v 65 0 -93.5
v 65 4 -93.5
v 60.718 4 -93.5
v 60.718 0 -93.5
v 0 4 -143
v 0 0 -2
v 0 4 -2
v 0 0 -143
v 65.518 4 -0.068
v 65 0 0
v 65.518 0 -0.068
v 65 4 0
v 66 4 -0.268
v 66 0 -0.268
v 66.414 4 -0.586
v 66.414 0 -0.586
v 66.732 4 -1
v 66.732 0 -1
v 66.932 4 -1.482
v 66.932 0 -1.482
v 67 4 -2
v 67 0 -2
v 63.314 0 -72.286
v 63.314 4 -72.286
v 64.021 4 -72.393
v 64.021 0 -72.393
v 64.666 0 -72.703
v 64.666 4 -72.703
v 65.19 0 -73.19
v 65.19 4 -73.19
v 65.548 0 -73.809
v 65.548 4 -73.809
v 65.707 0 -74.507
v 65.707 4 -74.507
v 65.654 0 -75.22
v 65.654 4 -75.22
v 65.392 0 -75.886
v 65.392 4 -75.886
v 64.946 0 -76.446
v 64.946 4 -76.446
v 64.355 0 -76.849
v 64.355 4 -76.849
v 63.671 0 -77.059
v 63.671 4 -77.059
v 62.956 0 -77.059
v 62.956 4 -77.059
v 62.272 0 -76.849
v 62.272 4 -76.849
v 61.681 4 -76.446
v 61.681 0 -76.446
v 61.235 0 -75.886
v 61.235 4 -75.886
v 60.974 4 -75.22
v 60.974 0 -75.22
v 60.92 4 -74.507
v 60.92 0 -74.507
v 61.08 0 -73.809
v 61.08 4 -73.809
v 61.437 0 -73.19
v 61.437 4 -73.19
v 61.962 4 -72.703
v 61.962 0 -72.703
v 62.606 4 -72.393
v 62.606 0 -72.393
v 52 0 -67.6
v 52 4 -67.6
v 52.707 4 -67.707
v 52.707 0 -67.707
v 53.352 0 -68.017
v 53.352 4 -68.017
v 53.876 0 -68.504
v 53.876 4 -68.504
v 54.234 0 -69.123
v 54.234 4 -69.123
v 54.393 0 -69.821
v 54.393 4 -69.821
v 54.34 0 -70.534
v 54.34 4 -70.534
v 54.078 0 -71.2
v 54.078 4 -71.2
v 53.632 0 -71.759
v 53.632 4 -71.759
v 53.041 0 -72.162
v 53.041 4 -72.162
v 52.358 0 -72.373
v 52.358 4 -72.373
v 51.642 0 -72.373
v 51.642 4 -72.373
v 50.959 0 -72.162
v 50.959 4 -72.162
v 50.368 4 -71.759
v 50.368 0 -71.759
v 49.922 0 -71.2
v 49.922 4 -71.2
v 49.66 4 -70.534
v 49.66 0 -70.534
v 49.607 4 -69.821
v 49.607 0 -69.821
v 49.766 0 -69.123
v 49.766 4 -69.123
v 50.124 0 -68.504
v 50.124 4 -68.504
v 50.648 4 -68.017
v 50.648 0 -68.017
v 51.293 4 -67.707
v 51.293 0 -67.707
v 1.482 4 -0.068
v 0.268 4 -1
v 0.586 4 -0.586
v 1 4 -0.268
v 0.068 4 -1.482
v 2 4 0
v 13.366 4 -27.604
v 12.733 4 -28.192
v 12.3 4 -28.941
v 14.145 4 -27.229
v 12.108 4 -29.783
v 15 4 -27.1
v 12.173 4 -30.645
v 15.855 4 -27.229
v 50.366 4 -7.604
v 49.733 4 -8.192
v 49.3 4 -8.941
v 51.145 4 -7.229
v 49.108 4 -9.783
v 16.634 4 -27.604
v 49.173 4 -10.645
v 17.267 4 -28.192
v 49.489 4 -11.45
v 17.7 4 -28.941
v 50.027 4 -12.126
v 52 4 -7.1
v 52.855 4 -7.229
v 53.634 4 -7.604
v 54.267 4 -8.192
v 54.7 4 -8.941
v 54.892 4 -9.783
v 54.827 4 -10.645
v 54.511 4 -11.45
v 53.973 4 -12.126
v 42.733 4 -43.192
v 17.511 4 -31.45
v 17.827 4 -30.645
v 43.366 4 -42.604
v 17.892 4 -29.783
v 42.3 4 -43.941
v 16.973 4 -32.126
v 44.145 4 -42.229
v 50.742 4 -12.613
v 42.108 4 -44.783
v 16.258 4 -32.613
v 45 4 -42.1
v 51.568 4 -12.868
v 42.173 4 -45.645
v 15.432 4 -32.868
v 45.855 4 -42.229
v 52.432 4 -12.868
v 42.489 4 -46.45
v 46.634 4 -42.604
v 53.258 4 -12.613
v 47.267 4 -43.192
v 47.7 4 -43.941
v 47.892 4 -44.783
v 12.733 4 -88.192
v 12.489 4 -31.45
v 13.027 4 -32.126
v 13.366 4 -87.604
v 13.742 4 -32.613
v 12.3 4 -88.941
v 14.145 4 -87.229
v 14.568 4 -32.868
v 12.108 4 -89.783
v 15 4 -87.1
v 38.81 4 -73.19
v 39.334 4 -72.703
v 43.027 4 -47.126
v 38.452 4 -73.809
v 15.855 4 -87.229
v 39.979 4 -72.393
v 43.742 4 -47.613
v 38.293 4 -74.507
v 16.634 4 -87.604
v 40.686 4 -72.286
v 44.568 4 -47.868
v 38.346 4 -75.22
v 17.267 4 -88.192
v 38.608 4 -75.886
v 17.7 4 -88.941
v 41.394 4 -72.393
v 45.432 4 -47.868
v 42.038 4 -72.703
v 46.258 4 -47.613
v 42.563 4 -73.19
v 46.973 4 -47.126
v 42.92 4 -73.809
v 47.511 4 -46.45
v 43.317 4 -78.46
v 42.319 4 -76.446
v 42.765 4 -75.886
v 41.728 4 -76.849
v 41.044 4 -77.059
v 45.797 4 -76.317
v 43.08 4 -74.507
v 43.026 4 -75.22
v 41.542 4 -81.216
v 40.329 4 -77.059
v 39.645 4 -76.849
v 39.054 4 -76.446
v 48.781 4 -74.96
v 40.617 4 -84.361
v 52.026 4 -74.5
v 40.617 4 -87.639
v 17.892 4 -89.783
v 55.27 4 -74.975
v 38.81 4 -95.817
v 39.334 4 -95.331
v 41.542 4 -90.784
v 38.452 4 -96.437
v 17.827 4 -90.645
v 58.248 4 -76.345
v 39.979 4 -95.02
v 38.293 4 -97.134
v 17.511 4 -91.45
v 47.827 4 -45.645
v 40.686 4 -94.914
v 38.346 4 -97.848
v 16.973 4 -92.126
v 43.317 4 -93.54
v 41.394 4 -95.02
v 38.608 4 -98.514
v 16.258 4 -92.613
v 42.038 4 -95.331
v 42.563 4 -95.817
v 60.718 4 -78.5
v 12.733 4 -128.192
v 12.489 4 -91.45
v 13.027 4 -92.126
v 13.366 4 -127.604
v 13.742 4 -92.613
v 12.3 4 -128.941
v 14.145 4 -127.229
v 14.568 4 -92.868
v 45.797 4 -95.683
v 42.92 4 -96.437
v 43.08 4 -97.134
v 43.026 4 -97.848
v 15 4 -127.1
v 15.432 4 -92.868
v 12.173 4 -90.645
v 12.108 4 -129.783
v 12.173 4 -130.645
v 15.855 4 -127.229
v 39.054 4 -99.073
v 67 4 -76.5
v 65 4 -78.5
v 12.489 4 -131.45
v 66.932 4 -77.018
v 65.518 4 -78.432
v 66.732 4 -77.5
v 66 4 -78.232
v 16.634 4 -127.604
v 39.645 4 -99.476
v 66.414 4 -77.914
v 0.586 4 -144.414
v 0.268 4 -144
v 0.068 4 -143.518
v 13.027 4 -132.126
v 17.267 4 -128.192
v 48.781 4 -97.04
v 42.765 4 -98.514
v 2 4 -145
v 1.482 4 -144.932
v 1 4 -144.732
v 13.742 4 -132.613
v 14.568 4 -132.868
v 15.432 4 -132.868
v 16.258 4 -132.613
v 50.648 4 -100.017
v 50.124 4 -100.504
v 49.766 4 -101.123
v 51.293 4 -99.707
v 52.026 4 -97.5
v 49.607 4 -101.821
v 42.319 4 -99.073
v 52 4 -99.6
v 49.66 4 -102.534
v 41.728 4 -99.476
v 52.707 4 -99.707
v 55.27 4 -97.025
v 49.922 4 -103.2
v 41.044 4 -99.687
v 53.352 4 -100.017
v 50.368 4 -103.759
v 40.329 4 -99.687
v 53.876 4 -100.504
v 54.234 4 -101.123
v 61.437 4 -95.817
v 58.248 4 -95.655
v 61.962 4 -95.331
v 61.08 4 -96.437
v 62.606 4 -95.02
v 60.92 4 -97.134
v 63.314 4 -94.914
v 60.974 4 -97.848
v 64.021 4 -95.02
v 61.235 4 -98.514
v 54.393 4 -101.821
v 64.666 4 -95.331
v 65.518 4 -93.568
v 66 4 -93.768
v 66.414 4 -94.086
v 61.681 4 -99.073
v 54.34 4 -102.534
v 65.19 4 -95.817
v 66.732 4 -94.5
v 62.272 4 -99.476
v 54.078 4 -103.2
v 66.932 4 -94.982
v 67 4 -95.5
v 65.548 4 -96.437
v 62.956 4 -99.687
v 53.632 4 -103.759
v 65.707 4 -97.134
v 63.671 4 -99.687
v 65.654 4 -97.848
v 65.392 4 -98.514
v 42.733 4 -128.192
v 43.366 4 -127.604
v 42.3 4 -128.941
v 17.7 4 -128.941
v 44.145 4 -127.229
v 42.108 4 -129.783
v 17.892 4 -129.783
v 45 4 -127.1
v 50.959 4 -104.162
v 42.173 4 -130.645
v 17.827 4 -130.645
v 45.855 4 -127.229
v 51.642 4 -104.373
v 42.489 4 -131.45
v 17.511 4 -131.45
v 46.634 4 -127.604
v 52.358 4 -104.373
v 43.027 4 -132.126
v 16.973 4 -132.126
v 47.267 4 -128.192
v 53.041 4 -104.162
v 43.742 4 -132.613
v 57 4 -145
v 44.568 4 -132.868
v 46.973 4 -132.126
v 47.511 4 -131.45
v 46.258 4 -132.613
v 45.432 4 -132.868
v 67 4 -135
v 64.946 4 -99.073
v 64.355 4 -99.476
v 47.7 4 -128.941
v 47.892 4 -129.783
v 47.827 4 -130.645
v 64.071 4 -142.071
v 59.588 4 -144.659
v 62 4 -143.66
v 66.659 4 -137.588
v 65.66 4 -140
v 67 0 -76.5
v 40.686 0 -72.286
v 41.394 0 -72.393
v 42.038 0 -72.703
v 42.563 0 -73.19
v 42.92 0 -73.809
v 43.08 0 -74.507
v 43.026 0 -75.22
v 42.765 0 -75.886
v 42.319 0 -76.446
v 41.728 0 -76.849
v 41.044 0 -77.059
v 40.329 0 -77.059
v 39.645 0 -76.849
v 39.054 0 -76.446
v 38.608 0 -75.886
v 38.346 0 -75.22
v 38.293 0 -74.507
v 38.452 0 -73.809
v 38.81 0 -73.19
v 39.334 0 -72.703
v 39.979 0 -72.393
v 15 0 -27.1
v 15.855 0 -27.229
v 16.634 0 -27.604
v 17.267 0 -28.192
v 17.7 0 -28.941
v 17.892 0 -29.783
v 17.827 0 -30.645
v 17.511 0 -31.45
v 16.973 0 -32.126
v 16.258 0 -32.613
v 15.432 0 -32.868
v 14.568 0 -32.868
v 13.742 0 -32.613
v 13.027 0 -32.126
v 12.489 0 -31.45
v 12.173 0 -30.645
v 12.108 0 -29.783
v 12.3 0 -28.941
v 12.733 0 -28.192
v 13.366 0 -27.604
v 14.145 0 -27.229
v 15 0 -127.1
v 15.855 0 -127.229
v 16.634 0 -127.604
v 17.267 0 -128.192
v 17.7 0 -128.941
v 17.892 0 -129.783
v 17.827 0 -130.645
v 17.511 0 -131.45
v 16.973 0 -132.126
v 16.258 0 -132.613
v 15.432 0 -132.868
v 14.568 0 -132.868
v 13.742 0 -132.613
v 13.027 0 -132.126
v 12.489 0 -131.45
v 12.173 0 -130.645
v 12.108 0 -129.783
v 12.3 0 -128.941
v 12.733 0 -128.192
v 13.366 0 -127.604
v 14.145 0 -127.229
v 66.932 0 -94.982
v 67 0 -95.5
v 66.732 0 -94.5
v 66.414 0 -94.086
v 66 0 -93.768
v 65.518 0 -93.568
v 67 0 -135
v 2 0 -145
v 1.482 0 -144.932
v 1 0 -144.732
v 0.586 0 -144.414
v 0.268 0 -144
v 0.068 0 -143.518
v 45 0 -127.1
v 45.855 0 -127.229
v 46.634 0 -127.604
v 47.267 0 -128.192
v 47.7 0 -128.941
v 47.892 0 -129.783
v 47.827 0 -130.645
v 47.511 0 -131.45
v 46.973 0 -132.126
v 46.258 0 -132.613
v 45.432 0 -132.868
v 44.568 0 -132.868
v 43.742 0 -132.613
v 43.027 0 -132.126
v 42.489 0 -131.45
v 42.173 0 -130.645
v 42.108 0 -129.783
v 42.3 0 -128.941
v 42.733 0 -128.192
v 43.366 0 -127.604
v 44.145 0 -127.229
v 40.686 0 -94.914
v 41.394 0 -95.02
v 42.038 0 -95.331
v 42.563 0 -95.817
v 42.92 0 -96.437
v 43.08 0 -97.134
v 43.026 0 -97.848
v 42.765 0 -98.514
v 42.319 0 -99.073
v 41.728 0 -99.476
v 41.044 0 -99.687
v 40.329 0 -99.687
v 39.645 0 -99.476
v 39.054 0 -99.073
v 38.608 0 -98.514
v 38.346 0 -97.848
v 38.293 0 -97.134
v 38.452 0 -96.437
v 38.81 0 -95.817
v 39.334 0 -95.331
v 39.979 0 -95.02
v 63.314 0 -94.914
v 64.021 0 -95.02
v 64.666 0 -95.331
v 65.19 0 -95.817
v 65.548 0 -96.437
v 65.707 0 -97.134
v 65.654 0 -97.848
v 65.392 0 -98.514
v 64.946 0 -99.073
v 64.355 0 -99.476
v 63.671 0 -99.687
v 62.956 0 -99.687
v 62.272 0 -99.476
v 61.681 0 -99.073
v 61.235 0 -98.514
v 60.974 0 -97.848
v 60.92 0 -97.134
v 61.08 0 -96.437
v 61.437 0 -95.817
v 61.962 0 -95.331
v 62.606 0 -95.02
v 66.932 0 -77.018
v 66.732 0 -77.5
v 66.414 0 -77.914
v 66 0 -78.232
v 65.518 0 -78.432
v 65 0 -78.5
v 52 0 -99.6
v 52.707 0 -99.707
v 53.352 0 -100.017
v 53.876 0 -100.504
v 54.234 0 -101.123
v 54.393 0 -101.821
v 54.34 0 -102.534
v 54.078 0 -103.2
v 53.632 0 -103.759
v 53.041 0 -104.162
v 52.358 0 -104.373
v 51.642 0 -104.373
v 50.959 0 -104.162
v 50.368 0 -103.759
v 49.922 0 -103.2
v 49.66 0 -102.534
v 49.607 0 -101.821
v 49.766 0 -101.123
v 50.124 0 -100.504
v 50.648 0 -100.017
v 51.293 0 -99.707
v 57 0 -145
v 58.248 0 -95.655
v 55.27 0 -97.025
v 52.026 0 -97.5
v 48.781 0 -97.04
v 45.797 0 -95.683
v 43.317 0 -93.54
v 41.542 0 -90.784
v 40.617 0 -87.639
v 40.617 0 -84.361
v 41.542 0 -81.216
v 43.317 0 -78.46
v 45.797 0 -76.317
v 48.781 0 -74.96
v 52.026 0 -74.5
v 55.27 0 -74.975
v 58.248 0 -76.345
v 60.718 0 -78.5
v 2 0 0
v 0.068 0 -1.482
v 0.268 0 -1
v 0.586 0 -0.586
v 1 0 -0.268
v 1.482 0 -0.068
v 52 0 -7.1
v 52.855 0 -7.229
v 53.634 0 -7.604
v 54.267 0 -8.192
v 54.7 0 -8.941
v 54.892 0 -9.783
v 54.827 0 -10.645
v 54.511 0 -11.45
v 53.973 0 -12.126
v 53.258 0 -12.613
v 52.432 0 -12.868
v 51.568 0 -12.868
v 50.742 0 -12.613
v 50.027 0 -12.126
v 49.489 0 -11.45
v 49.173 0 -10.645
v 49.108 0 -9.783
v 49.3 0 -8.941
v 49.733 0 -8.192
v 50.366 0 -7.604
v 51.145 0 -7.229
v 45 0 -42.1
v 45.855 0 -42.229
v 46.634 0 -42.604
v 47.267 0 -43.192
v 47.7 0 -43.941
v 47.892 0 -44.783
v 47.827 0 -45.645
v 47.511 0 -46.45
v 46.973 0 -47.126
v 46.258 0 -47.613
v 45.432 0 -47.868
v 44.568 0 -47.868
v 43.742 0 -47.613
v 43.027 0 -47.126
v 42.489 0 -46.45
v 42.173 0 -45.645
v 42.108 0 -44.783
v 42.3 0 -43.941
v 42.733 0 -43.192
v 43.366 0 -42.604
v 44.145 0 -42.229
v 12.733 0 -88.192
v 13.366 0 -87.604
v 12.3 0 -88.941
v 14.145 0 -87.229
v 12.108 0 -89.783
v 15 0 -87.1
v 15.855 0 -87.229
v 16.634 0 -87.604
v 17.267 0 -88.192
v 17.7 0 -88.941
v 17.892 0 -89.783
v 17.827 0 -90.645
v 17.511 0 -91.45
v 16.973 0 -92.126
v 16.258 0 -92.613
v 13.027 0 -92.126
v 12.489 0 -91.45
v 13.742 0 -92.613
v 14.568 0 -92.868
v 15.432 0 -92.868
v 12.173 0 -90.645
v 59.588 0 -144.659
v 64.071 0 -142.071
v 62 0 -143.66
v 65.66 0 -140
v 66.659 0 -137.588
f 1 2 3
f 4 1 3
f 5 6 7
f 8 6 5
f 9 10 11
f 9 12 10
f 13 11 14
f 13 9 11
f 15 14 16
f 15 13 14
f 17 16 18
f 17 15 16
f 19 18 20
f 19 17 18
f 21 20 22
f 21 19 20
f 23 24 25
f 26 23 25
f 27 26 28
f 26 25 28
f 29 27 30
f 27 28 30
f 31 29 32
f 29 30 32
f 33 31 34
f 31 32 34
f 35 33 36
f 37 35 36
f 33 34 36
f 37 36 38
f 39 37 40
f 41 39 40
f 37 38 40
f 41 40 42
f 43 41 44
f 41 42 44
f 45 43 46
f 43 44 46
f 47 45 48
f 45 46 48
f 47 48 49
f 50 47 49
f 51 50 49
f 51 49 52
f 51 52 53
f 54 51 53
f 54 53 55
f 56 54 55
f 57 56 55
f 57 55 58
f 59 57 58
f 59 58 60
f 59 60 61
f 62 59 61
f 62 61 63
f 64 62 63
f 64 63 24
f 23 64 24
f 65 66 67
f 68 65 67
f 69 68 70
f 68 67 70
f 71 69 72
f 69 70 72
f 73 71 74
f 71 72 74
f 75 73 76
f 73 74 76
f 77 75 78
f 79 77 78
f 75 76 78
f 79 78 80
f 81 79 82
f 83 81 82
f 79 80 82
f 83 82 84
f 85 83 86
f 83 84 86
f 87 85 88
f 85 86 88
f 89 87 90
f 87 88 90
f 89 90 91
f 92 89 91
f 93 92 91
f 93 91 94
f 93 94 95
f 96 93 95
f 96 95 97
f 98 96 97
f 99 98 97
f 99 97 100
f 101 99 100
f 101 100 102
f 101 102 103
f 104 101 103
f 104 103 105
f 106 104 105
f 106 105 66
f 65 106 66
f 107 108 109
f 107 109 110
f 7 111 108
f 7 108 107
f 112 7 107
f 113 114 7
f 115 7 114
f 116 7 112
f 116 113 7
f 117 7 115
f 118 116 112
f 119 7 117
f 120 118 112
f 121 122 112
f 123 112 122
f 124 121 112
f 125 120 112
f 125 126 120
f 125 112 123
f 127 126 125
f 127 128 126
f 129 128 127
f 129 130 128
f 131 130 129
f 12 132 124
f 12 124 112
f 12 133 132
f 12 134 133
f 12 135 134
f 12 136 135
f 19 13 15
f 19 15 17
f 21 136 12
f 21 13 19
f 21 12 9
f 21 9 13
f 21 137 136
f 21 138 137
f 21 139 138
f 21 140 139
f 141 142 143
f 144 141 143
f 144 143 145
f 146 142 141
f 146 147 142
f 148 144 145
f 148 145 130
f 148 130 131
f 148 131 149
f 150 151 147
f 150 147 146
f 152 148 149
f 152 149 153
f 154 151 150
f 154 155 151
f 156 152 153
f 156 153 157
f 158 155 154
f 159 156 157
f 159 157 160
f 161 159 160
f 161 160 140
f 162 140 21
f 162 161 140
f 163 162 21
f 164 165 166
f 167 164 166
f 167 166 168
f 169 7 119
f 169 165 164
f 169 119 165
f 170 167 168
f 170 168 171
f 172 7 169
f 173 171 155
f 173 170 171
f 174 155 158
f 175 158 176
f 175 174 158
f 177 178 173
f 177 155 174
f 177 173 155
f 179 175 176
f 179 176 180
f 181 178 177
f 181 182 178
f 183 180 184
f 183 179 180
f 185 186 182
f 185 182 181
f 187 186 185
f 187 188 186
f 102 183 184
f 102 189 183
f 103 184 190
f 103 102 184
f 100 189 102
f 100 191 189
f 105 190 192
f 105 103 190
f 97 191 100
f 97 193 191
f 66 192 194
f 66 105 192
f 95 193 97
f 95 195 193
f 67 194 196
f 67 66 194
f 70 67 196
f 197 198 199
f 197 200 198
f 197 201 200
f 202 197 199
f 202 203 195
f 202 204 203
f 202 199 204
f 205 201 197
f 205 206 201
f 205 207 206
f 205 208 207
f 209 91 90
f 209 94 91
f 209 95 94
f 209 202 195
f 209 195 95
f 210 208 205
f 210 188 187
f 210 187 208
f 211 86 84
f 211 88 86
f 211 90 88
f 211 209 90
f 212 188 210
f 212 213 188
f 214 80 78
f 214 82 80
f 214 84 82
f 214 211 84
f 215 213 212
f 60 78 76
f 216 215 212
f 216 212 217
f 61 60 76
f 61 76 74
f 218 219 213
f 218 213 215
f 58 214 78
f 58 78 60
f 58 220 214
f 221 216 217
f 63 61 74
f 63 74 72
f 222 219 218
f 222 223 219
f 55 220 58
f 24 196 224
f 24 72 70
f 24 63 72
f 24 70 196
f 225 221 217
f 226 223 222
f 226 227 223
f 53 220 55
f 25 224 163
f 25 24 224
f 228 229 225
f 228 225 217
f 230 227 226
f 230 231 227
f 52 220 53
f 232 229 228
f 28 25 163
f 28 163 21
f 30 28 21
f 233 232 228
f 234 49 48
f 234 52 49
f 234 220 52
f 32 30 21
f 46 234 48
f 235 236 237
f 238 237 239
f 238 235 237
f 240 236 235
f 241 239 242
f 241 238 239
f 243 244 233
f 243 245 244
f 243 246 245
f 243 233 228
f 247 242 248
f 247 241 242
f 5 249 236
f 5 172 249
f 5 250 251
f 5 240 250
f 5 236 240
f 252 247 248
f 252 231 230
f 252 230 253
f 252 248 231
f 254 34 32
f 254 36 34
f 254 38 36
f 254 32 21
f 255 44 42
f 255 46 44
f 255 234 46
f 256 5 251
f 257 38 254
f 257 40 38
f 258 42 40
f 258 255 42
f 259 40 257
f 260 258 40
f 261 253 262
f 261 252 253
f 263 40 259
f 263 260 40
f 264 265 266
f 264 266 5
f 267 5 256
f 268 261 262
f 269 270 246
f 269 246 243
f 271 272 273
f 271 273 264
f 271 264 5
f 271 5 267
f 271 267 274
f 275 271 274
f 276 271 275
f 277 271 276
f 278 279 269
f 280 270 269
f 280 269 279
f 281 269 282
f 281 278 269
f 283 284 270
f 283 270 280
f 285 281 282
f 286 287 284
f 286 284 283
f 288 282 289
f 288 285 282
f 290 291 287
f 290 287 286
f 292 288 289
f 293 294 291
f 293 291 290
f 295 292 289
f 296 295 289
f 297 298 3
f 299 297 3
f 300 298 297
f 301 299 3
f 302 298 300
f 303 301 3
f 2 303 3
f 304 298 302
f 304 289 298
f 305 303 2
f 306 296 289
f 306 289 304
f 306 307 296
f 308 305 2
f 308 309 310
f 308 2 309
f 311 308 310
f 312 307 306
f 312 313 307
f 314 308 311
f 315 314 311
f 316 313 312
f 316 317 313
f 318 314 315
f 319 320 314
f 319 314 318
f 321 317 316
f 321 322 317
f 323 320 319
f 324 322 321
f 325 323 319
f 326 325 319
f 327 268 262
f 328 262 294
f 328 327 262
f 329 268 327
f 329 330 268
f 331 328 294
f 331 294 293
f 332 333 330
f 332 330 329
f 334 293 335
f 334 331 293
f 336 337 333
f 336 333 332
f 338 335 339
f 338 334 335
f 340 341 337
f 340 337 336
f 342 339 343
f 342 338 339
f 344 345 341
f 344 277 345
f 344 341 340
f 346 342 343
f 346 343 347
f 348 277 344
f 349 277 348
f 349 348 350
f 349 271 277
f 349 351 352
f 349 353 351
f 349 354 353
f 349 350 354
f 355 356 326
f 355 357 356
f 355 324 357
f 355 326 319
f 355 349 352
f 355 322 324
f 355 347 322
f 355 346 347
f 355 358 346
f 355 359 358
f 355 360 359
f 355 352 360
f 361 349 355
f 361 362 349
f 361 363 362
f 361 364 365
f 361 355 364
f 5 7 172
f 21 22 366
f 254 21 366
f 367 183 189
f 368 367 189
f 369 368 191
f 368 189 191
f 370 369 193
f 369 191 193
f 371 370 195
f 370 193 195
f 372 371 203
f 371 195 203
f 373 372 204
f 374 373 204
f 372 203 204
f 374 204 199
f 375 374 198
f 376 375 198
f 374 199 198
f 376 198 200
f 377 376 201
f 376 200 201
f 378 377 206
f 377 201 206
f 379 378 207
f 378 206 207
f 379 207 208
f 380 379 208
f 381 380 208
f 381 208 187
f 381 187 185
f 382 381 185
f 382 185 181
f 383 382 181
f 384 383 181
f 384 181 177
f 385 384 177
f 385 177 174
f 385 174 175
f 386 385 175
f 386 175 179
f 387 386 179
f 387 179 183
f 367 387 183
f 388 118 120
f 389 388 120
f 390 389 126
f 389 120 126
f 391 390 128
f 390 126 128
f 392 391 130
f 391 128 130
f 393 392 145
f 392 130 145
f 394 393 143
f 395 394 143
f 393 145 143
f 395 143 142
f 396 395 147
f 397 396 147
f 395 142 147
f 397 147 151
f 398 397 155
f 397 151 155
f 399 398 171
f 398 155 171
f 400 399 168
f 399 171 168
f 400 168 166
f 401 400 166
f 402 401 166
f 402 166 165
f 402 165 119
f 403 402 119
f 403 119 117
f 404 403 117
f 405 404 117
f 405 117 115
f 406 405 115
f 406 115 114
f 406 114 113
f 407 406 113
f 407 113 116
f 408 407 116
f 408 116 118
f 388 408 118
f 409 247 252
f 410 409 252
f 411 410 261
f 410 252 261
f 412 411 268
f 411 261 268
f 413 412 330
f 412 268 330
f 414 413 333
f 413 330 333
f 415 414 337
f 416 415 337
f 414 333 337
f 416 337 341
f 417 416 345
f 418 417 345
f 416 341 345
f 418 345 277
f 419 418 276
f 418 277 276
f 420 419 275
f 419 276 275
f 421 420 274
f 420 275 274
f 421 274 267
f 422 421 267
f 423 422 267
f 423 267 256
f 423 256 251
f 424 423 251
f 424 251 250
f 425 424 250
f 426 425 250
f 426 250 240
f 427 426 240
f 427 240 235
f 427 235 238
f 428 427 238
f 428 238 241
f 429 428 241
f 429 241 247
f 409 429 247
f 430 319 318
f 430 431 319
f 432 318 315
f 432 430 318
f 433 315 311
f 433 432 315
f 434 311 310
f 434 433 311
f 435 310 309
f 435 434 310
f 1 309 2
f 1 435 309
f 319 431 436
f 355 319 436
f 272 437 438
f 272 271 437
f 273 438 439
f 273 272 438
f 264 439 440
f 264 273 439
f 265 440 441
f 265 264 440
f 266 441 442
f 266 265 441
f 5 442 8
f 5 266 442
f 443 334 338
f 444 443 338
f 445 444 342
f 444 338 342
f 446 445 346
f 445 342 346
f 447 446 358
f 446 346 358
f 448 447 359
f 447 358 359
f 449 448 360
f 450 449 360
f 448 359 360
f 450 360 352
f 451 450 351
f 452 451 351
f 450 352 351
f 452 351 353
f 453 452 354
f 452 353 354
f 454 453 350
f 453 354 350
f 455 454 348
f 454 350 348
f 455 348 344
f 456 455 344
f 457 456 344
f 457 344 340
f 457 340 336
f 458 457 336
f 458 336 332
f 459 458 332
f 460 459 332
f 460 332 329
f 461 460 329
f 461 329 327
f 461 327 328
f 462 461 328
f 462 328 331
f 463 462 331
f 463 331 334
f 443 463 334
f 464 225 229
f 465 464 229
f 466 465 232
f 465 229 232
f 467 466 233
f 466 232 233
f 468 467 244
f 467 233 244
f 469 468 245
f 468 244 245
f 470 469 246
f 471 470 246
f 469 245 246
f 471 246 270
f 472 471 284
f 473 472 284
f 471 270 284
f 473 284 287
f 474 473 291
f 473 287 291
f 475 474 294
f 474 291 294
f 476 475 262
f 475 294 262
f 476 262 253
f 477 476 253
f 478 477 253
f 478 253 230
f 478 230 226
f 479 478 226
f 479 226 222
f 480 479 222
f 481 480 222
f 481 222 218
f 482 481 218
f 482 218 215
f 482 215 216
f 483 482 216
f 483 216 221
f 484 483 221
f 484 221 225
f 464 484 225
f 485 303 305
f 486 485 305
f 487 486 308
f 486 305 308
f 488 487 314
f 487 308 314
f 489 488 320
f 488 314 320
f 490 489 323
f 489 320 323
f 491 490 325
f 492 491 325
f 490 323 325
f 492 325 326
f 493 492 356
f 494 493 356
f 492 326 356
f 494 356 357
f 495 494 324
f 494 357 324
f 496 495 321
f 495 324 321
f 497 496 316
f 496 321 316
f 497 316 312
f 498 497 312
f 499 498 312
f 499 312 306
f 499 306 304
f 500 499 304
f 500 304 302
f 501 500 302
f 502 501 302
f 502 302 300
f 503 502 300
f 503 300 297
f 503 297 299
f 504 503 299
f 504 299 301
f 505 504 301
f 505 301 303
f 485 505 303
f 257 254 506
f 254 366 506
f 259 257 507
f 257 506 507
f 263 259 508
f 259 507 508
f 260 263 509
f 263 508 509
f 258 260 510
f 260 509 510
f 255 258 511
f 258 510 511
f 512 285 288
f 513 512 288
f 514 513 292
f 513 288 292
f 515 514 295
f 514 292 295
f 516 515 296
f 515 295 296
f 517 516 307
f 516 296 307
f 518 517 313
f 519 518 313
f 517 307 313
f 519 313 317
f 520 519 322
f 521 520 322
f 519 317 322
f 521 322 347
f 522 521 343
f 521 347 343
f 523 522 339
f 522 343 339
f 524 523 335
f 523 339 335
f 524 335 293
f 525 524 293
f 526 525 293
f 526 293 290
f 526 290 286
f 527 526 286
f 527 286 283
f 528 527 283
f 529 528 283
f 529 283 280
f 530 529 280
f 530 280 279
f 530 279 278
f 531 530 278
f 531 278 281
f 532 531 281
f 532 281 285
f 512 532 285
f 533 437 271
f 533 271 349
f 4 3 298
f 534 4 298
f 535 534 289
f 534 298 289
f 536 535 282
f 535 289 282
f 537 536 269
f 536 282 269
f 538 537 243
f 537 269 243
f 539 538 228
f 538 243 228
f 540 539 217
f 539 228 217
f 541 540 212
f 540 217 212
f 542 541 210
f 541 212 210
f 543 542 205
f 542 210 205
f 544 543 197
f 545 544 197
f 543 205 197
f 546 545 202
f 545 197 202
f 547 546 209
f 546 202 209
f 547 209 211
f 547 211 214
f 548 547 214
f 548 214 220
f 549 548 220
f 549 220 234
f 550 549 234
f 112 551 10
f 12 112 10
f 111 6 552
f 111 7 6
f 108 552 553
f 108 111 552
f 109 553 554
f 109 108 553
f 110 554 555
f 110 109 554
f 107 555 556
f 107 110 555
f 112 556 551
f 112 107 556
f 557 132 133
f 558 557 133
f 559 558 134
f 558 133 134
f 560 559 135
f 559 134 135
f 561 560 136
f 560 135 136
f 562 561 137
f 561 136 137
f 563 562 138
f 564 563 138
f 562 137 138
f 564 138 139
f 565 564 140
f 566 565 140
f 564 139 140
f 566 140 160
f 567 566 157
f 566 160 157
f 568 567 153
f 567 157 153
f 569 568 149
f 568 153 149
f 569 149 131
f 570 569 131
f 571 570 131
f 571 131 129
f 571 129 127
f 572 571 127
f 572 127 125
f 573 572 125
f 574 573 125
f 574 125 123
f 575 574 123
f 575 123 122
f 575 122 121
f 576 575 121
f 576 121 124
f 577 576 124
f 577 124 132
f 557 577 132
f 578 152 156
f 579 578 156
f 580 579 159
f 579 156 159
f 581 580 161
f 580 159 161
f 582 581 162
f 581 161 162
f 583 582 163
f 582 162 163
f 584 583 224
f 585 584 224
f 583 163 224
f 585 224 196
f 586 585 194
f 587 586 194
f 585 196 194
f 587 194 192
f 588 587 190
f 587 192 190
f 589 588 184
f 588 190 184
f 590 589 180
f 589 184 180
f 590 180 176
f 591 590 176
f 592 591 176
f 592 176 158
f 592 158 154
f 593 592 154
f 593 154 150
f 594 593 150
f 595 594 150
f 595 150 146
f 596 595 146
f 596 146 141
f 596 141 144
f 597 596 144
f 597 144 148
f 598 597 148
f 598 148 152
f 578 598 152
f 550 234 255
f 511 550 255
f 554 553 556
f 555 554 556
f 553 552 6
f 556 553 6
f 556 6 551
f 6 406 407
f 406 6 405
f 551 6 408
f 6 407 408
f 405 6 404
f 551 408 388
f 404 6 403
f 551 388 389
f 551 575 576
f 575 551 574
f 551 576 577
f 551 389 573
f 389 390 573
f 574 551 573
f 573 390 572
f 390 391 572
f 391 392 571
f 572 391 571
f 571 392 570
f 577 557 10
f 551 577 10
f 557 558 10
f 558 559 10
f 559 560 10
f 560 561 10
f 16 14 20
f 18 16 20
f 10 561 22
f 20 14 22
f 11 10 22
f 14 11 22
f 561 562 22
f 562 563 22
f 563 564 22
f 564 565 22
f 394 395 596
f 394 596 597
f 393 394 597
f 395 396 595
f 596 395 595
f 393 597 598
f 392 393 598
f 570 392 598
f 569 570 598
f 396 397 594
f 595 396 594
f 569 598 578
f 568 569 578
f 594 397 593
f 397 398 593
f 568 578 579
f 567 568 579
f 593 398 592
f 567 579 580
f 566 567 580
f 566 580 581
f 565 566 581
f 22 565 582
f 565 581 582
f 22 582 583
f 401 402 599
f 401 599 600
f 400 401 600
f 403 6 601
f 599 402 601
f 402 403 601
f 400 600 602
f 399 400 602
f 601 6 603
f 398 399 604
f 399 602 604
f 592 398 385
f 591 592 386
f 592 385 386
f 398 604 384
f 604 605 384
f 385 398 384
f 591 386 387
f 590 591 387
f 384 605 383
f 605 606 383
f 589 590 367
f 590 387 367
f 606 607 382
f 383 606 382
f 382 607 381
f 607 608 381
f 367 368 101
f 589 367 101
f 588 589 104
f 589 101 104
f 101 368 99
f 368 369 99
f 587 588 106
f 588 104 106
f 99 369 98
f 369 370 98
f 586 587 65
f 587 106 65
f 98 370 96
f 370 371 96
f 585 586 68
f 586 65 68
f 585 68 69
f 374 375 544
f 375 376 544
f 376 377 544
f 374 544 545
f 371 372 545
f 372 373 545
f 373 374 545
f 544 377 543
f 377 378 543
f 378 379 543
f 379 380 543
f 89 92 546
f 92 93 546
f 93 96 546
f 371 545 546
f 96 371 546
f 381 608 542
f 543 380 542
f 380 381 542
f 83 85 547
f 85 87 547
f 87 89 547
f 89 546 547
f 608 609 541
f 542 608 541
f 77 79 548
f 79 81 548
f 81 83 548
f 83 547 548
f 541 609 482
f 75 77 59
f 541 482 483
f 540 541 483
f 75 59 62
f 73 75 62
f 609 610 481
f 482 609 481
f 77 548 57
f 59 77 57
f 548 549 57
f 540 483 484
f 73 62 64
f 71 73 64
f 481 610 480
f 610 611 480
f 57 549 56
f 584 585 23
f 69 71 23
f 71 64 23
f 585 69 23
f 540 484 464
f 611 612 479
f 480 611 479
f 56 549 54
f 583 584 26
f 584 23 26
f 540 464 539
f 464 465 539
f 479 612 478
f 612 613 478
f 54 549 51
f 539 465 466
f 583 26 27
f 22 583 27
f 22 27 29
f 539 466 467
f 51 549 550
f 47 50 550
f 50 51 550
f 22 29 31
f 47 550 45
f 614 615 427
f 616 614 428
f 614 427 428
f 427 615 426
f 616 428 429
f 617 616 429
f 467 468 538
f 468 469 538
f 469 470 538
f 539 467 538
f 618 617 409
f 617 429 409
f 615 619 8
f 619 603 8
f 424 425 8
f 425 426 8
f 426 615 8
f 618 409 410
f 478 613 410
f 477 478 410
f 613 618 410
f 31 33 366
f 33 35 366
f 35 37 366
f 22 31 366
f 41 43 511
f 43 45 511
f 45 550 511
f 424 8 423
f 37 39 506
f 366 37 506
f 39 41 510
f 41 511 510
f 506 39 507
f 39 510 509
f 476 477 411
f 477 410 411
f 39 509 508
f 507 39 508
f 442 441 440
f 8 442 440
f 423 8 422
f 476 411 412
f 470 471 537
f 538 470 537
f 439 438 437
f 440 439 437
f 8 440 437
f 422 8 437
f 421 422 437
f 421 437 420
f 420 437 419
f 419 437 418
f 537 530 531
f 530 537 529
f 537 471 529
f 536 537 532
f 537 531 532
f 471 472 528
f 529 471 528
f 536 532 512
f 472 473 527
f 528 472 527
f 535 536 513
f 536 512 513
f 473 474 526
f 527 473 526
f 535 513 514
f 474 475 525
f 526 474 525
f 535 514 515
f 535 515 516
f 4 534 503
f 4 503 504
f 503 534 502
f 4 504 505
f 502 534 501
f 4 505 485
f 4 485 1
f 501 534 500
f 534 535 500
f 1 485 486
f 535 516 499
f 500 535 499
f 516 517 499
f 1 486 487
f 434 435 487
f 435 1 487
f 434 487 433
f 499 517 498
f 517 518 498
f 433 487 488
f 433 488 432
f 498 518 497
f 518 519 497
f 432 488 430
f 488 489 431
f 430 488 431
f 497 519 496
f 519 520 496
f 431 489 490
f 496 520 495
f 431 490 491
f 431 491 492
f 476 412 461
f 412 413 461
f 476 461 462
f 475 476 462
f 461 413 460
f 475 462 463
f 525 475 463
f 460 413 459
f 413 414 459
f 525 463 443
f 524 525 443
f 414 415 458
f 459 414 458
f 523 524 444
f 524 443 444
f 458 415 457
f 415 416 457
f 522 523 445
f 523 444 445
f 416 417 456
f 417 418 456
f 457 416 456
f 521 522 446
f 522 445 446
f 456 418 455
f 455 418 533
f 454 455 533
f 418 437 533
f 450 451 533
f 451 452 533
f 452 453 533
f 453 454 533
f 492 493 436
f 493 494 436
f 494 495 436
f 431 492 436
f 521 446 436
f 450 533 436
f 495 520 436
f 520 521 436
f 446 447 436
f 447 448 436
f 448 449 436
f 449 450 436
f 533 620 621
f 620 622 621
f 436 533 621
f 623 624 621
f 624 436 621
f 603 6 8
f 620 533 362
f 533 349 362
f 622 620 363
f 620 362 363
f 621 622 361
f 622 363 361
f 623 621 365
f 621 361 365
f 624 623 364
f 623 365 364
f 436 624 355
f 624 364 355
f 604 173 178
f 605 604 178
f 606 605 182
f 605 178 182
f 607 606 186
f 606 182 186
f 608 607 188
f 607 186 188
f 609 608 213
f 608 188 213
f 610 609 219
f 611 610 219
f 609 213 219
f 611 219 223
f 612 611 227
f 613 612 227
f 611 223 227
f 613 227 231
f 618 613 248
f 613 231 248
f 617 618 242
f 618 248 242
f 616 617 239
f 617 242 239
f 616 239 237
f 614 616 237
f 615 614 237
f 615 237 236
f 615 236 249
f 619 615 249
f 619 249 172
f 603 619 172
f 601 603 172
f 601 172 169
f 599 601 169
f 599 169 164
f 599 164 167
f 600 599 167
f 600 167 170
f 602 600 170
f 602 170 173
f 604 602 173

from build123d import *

# Parameters (mm, degrees)
SKETCH1_W           = 67
SKETCH1_H           = 145
BOSS_EXTRUDE1_DEPTH = 4
CUT_EXTRUDE1_DEPTH  = 160.781100259
SKETCH4_R           = 2.4
CUT_EXTRUDE2_DEPTH  = 160.781100259
SKETCH5_R           = 2.9
CUT_EXTRUDE3_DEPTH  = 160.781100259
FILLET1_R           = 10
FILLET2_R           = 2


with BuildPart() as part:
    # Sketch1 → Boss-Extrude1 (new body)
    with BuildSketch(Plane(origin=(0, 0, 0), x_dir=(1, 0, 0), z_dir=(0, 1, 0))):
        with Locations((33.5, 72.5)):
            Rectangle(SKETCH1_W, SKETCH1_H)
    extrude(amount=BOSS_EXTRUDE1_DEPTH)

    # Sketch2 → Cut-Extrude1 (cut, through all)
    with BuildSketch(Plane(origin=(0, 4, 0), x_dir=(1, 0, 0), z_dir=(0, 1, 0))):
        with BuildLine():
            Line((67, 78.5), (67, 93.5))
            Line((67, 93.5), (60.717797887, 93.5))
            ThreePointArc((60.717797887, 93.5), (40.5, 86), (60.717797887, 78.5))
            Line((60.717797887, 78.5), (67, 78.5))
        make_face()
    extrude(amount=-CUT_EXTRUDE1_DEPTH, mode=Mode.SUBTRACT)

    # Sketch4 → Cut-Extrude2 (cut, through all)
    with BuildSketch(Plane(origin=(0, 4, 0), x_dir=(1, 0, 0), z_dir=(0, 1, 0))):
        with Locations(Location((63.31370855, 74.68629145, 0), (0, 0, 270))):
            Circle(SKETCH4_R)
        with Locations(Location((52, 69.999999928, 0), (0, 0, 270))):
            Circle(SKETCH4_R)
        with Locations(Location((40.68629145, 74.68629145, 0), (0, 0, 270))):
            Circle(SKETCH4_R)
        with Locations(Location((40.68629145, 97.31370855, 0), (0, 0, 270))):
            Circle(SKETCH4_R)
        with Locations(Location((52, 102.000000072, 0), (0, 0, 270))):
            Circle(SKETCH4_R)
        with Locations(Location((63.31370855, 97.31370855, 0), (0, 0, 270))):
            Circle(SKETCH4_R)
    extrude(amount=-CUT_EXTRUDE2_DEPTH, mode=Mode.SUBTRACT)

    # Sketch5 → Cut-Extrude3 (cut, through all)
    with BuildSketch(Plane(origin=(0, 4, 0), x_dir=(1, 0, 0), z_dir=(0, 1, 0))):
        with Locations(Location((15, 130, 0), (0, 0, 270))):
            Circle(SKETCH5_R)
        with Locations(Location((15, 90, 0), (0, 0, 270))):
            Circle(SKETCH5_R)
        with Locations(Location((52, 10, 0), (0, 0, 270))):
            Circle(SKETCH5_R)
        with Locations(Location((15, 30, 0), (0, 0, 270))):
            Circle(SKETCH5_R)
        with Locations(Location((45, 130, 0), (0, 0, 270))):
            Circle(SKETCH5_R)
        with Locations(Location((45, 45, 0), (0, 0, 270))):
            Circle(SKETCH5_R)
    extrude(amount=-CUT_EXTRUDE3_DEPTH, mode=Mode.SUBTRACT)

    # Fillet1
    fillet1_edges = [part.edges().sort_by_distance(p)[0] for p in [
        (67, 2, -145),
    ]]
    fillet(fillet1_edges, radius=FILLET1_R)

    # Fillet2
    fillet2_edges = [part.edges().sort_by_distance(p)[0] for p in [
        (67, 2, -93.5),
        (67, 2, -78.5),
        (0, 2, -145),
        (67, 2, 0),
        (0, 2, 0),
    ]]
    fillet(fillet2_edges, radius=FILLET2_R)


solid = part.part
